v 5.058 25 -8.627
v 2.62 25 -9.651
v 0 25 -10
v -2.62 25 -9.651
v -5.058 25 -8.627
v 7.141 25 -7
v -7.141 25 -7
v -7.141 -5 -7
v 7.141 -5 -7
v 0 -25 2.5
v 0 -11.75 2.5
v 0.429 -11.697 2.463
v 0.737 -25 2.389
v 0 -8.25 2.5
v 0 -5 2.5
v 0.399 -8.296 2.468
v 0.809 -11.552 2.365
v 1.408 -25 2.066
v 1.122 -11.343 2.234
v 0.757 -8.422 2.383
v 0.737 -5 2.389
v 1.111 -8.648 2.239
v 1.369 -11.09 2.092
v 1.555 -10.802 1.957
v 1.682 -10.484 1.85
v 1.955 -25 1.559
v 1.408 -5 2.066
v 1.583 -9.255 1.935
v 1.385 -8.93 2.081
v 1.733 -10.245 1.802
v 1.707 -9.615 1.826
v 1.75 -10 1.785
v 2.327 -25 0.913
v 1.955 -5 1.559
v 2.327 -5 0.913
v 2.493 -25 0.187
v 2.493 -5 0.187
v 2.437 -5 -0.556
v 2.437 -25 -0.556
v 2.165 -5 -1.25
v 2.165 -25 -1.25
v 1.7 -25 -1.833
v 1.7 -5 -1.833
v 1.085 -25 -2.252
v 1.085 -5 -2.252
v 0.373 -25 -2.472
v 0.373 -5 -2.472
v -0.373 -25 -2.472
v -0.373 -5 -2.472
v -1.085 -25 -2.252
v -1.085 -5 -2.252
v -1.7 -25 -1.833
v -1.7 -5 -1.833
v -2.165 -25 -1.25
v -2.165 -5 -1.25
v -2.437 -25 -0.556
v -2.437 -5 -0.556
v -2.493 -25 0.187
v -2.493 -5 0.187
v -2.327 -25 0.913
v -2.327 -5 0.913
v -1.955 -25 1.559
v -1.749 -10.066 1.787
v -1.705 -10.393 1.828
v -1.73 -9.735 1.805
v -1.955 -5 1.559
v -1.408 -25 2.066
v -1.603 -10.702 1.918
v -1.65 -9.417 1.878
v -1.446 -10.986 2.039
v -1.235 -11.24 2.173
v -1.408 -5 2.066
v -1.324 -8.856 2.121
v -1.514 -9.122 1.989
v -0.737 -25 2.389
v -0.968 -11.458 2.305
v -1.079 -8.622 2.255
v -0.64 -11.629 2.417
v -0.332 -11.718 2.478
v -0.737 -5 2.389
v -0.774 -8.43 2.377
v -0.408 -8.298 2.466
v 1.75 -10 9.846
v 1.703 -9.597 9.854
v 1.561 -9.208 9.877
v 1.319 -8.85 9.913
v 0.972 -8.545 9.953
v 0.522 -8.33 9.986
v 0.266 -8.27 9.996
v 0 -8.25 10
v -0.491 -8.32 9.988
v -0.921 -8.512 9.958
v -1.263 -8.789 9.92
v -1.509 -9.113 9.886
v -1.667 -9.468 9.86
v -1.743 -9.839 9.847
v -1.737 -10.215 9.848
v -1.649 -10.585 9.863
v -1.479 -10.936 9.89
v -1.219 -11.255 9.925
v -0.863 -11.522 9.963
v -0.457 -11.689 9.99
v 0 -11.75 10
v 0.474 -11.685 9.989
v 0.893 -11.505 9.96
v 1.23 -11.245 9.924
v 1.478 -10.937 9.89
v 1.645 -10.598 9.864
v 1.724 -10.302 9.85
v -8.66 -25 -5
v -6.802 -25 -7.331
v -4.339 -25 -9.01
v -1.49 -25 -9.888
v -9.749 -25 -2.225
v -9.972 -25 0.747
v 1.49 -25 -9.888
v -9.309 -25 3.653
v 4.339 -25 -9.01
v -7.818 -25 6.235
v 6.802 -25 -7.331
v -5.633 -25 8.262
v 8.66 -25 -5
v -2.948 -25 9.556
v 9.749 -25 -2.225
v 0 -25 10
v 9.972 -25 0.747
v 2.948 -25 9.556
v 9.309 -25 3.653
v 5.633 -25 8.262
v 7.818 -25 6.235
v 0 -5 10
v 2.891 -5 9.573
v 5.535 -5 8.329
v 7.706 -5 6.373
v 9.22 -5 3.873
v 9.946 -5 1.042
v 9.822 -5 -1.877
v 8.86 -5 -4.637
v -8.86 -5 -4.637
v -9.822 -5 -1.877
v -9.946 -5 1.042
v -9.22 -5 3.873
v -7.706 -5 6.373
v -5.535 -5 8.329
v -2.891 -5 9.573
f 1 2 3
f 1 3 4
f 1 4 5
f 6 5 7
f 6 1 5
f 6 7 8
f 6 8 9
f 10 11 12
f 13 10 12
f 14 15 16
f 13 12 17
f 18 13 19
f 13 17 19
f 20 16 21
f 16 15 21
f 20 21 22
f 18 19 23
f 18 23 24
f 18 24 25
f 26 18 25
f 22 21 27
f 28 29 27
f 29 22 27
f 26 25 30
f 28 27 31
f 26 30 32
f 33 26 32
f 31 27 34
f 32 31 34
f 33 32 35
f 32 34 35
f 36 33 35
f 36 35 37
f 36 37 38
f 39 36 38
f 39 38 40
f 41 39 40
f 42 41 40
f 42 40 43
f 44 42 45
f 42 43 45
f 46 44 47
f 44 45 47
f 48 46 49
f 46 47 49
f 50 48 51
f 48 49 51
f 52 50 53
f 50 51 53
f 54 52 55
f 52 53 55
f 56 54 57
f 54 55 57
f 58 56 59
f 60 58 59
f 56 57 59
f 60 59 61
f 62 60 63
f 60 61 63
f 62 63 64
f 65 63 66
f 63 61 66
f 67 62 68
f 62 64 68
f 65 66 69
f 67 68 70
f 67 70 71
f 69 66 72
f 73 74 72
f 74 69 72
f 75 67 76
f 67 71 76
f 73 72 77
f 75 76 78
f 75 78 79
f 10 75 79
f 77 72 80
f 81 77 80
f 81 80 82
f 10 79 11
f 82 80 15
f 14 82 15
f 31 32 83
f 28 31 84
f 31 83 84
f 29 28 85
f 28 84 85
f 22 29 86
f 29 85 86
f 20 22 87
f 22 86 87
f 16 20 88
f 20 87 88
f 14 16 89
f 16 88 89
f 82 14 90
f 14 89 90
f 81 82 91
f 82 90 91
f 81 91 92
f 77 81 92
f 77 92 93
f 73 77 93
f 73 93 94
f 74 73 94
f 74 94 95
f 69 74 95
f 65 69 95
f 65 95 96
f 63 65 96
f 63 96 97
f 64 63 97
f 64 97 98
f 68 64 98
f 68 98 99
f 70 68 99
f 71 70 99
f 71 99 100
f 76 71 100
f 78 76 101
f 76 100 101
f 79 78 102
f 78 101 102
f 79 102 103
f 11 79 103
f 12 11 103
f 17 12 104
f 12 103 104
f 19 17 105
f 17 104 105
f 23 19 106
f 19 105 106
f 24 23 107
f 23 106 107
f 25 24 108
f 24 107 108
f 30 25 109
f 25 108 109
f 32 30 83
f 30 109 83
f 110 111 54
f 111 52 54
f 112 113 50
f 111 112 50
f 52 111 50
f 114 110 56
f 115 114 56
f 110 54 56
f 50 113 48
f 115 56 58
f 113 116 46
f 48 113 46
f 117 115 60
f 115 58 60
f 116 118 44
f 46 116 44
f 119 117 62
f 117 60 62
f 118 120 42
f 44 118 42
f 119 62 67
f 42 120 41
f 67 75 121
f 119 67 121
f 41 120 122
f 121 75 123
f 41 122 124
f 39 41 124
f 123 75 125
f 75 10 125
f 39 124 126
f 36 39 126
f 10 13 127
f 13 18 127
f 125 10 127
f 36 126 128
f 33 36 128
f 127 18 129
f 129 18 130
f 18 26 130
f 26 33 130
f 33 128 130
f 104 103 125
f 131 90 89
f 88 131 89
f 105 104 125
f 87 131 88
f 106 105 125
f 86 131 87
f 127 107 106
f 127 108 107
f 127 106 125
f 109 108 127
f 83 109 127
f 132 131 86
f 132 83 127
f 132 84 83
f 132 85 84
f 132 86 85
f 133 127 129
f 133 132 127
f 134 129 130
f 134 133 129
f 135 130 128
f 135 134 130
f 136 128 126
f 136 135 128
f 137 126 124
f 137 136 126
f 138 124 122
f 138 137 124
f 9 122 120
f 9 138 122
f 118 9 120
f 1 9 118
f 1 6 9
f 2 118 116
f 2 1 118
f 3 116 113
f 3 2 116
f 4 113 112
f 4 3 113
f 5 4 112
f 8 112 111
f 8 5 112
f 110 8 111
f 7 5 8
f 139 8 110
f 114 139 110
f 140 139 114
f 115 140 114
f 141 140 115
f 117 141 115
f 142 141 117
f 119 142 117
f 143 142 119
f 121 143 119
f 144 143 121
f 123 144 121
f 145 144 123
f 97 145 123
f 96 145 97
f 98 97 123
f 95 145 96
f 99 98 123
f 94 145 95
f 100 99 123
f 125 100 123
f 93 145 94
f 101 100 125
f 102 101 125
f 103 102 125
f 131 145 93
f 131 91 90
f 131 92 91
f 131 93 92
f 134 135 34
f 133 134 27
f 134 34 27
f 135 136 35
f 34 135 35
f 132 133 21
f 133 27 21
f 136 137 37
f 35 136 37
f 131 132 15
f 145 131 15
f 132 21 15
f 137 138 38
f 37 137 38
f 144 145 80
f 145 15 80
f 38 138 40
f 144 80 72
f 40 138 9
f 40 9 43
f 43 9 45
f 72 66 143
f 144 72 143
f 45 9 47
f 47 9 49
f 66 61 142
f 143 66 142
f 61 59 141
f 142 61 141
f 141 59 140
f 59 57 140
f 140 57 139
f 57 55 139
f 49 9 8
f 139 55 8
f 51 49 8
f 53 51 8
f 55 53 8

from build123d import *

# Parameters (mm, degrees)
CROQUIS1_R                 = 10
SALIENTE_EXTRUIR1_DEPTH    = 25
CROQUIS3_R                 = 2.5
CORTAR_EXTRUIR2_DEPTH      = 52.961524227
CORTAR_EXTRUIR1_DEPTH      = 30
CORTAR_EXTRUIR3_REACH      = 39.417
CORTAR_EXTRUIR3_END_RADIUS = 2.5
CROQUIS7_R                 = 1.75


with BuildPart() as part:
    # Croquis1 → Saliente-Extruir1 (new, symmetric)
    with BuildSketch(Plane(origin=(0, 0, 0), x_dir=(1, 0, 0), z_dir=(0, 1, 0))):
        with Locations(Location((0, 0, 0), (0, 0, 270))):
            Circle(CROQUIS1_R)
    extrude(amount=SALIENTE_EXTRUIR1_DEPTH, both=True)

    # Croquis3 → Cortar-Extruir2 (cut, through all)
    with BuildSketch(Plane(origin=(0, 25, 0), x_dir=(1, 0, 0), z_dir=(0, 1, 0))):
        with Locations(Location((0, 0, 0), (0, 0, 270))):
            Circle(CROQUIS3_R)
    extrude(amount=-CORTAR_EXTRUIR2_DEPTH, mode=Mode.SUBTRACT)

    # Croquis2 → Cortar-Extruir1 (cut)
    with BuildSketch(Plane(origin=(0, 25, 0), x_dir=(1, 0, 0), z_dir=(0, 1, 0))):
        with BuildLine():
            Line((-7.141428429, 7), (7.141428429, 7))
            ThreePointArc((7.141428429, 7), (0, -10), (-7.141428429, 7))
        make_face()
    extrude(amount=-CORTAR_EXTRUIR1_DEPTH, mode=Mode.SUBTRACT)

    # Cortar-Extruir3: up to this cylinder (the profile starts outside it)
    cortar_extruir3_end = Plane(origin=(0, -10, 0), z_dir=(0, 1, 0)) * Cylinder(CORTAR_EXTRUIR3_END_RADIUS, 84.834, mode=Mode.PRIVATE)
    # Croquis7 → Cortar-Extruir3 (cut, up to the surface)
    with BuildSketch(Plane(origin=(0, -5, 10), x_dir=(1, 0, 0), z_dir=(0, 0, 1)), mode=Mode.PRIVATE) as cortar_extruir3_sk1:
        with Locations((0, -5)):
            Circle(CROQUIS7_R)
    cortar_extruir3_tool1 = extrude(cortar_extruir3_sk1.sketch, amount=-CORTAR_EXTRUIR3_REACH, mode=Mode.PRIVATE) - cortar_extruir3_end
    add(cortar_extruir3_tool1.solids().sort_by_distance((0, -10, 10))[0], mode=Mode.SUBTRACT)


solid = part.part
